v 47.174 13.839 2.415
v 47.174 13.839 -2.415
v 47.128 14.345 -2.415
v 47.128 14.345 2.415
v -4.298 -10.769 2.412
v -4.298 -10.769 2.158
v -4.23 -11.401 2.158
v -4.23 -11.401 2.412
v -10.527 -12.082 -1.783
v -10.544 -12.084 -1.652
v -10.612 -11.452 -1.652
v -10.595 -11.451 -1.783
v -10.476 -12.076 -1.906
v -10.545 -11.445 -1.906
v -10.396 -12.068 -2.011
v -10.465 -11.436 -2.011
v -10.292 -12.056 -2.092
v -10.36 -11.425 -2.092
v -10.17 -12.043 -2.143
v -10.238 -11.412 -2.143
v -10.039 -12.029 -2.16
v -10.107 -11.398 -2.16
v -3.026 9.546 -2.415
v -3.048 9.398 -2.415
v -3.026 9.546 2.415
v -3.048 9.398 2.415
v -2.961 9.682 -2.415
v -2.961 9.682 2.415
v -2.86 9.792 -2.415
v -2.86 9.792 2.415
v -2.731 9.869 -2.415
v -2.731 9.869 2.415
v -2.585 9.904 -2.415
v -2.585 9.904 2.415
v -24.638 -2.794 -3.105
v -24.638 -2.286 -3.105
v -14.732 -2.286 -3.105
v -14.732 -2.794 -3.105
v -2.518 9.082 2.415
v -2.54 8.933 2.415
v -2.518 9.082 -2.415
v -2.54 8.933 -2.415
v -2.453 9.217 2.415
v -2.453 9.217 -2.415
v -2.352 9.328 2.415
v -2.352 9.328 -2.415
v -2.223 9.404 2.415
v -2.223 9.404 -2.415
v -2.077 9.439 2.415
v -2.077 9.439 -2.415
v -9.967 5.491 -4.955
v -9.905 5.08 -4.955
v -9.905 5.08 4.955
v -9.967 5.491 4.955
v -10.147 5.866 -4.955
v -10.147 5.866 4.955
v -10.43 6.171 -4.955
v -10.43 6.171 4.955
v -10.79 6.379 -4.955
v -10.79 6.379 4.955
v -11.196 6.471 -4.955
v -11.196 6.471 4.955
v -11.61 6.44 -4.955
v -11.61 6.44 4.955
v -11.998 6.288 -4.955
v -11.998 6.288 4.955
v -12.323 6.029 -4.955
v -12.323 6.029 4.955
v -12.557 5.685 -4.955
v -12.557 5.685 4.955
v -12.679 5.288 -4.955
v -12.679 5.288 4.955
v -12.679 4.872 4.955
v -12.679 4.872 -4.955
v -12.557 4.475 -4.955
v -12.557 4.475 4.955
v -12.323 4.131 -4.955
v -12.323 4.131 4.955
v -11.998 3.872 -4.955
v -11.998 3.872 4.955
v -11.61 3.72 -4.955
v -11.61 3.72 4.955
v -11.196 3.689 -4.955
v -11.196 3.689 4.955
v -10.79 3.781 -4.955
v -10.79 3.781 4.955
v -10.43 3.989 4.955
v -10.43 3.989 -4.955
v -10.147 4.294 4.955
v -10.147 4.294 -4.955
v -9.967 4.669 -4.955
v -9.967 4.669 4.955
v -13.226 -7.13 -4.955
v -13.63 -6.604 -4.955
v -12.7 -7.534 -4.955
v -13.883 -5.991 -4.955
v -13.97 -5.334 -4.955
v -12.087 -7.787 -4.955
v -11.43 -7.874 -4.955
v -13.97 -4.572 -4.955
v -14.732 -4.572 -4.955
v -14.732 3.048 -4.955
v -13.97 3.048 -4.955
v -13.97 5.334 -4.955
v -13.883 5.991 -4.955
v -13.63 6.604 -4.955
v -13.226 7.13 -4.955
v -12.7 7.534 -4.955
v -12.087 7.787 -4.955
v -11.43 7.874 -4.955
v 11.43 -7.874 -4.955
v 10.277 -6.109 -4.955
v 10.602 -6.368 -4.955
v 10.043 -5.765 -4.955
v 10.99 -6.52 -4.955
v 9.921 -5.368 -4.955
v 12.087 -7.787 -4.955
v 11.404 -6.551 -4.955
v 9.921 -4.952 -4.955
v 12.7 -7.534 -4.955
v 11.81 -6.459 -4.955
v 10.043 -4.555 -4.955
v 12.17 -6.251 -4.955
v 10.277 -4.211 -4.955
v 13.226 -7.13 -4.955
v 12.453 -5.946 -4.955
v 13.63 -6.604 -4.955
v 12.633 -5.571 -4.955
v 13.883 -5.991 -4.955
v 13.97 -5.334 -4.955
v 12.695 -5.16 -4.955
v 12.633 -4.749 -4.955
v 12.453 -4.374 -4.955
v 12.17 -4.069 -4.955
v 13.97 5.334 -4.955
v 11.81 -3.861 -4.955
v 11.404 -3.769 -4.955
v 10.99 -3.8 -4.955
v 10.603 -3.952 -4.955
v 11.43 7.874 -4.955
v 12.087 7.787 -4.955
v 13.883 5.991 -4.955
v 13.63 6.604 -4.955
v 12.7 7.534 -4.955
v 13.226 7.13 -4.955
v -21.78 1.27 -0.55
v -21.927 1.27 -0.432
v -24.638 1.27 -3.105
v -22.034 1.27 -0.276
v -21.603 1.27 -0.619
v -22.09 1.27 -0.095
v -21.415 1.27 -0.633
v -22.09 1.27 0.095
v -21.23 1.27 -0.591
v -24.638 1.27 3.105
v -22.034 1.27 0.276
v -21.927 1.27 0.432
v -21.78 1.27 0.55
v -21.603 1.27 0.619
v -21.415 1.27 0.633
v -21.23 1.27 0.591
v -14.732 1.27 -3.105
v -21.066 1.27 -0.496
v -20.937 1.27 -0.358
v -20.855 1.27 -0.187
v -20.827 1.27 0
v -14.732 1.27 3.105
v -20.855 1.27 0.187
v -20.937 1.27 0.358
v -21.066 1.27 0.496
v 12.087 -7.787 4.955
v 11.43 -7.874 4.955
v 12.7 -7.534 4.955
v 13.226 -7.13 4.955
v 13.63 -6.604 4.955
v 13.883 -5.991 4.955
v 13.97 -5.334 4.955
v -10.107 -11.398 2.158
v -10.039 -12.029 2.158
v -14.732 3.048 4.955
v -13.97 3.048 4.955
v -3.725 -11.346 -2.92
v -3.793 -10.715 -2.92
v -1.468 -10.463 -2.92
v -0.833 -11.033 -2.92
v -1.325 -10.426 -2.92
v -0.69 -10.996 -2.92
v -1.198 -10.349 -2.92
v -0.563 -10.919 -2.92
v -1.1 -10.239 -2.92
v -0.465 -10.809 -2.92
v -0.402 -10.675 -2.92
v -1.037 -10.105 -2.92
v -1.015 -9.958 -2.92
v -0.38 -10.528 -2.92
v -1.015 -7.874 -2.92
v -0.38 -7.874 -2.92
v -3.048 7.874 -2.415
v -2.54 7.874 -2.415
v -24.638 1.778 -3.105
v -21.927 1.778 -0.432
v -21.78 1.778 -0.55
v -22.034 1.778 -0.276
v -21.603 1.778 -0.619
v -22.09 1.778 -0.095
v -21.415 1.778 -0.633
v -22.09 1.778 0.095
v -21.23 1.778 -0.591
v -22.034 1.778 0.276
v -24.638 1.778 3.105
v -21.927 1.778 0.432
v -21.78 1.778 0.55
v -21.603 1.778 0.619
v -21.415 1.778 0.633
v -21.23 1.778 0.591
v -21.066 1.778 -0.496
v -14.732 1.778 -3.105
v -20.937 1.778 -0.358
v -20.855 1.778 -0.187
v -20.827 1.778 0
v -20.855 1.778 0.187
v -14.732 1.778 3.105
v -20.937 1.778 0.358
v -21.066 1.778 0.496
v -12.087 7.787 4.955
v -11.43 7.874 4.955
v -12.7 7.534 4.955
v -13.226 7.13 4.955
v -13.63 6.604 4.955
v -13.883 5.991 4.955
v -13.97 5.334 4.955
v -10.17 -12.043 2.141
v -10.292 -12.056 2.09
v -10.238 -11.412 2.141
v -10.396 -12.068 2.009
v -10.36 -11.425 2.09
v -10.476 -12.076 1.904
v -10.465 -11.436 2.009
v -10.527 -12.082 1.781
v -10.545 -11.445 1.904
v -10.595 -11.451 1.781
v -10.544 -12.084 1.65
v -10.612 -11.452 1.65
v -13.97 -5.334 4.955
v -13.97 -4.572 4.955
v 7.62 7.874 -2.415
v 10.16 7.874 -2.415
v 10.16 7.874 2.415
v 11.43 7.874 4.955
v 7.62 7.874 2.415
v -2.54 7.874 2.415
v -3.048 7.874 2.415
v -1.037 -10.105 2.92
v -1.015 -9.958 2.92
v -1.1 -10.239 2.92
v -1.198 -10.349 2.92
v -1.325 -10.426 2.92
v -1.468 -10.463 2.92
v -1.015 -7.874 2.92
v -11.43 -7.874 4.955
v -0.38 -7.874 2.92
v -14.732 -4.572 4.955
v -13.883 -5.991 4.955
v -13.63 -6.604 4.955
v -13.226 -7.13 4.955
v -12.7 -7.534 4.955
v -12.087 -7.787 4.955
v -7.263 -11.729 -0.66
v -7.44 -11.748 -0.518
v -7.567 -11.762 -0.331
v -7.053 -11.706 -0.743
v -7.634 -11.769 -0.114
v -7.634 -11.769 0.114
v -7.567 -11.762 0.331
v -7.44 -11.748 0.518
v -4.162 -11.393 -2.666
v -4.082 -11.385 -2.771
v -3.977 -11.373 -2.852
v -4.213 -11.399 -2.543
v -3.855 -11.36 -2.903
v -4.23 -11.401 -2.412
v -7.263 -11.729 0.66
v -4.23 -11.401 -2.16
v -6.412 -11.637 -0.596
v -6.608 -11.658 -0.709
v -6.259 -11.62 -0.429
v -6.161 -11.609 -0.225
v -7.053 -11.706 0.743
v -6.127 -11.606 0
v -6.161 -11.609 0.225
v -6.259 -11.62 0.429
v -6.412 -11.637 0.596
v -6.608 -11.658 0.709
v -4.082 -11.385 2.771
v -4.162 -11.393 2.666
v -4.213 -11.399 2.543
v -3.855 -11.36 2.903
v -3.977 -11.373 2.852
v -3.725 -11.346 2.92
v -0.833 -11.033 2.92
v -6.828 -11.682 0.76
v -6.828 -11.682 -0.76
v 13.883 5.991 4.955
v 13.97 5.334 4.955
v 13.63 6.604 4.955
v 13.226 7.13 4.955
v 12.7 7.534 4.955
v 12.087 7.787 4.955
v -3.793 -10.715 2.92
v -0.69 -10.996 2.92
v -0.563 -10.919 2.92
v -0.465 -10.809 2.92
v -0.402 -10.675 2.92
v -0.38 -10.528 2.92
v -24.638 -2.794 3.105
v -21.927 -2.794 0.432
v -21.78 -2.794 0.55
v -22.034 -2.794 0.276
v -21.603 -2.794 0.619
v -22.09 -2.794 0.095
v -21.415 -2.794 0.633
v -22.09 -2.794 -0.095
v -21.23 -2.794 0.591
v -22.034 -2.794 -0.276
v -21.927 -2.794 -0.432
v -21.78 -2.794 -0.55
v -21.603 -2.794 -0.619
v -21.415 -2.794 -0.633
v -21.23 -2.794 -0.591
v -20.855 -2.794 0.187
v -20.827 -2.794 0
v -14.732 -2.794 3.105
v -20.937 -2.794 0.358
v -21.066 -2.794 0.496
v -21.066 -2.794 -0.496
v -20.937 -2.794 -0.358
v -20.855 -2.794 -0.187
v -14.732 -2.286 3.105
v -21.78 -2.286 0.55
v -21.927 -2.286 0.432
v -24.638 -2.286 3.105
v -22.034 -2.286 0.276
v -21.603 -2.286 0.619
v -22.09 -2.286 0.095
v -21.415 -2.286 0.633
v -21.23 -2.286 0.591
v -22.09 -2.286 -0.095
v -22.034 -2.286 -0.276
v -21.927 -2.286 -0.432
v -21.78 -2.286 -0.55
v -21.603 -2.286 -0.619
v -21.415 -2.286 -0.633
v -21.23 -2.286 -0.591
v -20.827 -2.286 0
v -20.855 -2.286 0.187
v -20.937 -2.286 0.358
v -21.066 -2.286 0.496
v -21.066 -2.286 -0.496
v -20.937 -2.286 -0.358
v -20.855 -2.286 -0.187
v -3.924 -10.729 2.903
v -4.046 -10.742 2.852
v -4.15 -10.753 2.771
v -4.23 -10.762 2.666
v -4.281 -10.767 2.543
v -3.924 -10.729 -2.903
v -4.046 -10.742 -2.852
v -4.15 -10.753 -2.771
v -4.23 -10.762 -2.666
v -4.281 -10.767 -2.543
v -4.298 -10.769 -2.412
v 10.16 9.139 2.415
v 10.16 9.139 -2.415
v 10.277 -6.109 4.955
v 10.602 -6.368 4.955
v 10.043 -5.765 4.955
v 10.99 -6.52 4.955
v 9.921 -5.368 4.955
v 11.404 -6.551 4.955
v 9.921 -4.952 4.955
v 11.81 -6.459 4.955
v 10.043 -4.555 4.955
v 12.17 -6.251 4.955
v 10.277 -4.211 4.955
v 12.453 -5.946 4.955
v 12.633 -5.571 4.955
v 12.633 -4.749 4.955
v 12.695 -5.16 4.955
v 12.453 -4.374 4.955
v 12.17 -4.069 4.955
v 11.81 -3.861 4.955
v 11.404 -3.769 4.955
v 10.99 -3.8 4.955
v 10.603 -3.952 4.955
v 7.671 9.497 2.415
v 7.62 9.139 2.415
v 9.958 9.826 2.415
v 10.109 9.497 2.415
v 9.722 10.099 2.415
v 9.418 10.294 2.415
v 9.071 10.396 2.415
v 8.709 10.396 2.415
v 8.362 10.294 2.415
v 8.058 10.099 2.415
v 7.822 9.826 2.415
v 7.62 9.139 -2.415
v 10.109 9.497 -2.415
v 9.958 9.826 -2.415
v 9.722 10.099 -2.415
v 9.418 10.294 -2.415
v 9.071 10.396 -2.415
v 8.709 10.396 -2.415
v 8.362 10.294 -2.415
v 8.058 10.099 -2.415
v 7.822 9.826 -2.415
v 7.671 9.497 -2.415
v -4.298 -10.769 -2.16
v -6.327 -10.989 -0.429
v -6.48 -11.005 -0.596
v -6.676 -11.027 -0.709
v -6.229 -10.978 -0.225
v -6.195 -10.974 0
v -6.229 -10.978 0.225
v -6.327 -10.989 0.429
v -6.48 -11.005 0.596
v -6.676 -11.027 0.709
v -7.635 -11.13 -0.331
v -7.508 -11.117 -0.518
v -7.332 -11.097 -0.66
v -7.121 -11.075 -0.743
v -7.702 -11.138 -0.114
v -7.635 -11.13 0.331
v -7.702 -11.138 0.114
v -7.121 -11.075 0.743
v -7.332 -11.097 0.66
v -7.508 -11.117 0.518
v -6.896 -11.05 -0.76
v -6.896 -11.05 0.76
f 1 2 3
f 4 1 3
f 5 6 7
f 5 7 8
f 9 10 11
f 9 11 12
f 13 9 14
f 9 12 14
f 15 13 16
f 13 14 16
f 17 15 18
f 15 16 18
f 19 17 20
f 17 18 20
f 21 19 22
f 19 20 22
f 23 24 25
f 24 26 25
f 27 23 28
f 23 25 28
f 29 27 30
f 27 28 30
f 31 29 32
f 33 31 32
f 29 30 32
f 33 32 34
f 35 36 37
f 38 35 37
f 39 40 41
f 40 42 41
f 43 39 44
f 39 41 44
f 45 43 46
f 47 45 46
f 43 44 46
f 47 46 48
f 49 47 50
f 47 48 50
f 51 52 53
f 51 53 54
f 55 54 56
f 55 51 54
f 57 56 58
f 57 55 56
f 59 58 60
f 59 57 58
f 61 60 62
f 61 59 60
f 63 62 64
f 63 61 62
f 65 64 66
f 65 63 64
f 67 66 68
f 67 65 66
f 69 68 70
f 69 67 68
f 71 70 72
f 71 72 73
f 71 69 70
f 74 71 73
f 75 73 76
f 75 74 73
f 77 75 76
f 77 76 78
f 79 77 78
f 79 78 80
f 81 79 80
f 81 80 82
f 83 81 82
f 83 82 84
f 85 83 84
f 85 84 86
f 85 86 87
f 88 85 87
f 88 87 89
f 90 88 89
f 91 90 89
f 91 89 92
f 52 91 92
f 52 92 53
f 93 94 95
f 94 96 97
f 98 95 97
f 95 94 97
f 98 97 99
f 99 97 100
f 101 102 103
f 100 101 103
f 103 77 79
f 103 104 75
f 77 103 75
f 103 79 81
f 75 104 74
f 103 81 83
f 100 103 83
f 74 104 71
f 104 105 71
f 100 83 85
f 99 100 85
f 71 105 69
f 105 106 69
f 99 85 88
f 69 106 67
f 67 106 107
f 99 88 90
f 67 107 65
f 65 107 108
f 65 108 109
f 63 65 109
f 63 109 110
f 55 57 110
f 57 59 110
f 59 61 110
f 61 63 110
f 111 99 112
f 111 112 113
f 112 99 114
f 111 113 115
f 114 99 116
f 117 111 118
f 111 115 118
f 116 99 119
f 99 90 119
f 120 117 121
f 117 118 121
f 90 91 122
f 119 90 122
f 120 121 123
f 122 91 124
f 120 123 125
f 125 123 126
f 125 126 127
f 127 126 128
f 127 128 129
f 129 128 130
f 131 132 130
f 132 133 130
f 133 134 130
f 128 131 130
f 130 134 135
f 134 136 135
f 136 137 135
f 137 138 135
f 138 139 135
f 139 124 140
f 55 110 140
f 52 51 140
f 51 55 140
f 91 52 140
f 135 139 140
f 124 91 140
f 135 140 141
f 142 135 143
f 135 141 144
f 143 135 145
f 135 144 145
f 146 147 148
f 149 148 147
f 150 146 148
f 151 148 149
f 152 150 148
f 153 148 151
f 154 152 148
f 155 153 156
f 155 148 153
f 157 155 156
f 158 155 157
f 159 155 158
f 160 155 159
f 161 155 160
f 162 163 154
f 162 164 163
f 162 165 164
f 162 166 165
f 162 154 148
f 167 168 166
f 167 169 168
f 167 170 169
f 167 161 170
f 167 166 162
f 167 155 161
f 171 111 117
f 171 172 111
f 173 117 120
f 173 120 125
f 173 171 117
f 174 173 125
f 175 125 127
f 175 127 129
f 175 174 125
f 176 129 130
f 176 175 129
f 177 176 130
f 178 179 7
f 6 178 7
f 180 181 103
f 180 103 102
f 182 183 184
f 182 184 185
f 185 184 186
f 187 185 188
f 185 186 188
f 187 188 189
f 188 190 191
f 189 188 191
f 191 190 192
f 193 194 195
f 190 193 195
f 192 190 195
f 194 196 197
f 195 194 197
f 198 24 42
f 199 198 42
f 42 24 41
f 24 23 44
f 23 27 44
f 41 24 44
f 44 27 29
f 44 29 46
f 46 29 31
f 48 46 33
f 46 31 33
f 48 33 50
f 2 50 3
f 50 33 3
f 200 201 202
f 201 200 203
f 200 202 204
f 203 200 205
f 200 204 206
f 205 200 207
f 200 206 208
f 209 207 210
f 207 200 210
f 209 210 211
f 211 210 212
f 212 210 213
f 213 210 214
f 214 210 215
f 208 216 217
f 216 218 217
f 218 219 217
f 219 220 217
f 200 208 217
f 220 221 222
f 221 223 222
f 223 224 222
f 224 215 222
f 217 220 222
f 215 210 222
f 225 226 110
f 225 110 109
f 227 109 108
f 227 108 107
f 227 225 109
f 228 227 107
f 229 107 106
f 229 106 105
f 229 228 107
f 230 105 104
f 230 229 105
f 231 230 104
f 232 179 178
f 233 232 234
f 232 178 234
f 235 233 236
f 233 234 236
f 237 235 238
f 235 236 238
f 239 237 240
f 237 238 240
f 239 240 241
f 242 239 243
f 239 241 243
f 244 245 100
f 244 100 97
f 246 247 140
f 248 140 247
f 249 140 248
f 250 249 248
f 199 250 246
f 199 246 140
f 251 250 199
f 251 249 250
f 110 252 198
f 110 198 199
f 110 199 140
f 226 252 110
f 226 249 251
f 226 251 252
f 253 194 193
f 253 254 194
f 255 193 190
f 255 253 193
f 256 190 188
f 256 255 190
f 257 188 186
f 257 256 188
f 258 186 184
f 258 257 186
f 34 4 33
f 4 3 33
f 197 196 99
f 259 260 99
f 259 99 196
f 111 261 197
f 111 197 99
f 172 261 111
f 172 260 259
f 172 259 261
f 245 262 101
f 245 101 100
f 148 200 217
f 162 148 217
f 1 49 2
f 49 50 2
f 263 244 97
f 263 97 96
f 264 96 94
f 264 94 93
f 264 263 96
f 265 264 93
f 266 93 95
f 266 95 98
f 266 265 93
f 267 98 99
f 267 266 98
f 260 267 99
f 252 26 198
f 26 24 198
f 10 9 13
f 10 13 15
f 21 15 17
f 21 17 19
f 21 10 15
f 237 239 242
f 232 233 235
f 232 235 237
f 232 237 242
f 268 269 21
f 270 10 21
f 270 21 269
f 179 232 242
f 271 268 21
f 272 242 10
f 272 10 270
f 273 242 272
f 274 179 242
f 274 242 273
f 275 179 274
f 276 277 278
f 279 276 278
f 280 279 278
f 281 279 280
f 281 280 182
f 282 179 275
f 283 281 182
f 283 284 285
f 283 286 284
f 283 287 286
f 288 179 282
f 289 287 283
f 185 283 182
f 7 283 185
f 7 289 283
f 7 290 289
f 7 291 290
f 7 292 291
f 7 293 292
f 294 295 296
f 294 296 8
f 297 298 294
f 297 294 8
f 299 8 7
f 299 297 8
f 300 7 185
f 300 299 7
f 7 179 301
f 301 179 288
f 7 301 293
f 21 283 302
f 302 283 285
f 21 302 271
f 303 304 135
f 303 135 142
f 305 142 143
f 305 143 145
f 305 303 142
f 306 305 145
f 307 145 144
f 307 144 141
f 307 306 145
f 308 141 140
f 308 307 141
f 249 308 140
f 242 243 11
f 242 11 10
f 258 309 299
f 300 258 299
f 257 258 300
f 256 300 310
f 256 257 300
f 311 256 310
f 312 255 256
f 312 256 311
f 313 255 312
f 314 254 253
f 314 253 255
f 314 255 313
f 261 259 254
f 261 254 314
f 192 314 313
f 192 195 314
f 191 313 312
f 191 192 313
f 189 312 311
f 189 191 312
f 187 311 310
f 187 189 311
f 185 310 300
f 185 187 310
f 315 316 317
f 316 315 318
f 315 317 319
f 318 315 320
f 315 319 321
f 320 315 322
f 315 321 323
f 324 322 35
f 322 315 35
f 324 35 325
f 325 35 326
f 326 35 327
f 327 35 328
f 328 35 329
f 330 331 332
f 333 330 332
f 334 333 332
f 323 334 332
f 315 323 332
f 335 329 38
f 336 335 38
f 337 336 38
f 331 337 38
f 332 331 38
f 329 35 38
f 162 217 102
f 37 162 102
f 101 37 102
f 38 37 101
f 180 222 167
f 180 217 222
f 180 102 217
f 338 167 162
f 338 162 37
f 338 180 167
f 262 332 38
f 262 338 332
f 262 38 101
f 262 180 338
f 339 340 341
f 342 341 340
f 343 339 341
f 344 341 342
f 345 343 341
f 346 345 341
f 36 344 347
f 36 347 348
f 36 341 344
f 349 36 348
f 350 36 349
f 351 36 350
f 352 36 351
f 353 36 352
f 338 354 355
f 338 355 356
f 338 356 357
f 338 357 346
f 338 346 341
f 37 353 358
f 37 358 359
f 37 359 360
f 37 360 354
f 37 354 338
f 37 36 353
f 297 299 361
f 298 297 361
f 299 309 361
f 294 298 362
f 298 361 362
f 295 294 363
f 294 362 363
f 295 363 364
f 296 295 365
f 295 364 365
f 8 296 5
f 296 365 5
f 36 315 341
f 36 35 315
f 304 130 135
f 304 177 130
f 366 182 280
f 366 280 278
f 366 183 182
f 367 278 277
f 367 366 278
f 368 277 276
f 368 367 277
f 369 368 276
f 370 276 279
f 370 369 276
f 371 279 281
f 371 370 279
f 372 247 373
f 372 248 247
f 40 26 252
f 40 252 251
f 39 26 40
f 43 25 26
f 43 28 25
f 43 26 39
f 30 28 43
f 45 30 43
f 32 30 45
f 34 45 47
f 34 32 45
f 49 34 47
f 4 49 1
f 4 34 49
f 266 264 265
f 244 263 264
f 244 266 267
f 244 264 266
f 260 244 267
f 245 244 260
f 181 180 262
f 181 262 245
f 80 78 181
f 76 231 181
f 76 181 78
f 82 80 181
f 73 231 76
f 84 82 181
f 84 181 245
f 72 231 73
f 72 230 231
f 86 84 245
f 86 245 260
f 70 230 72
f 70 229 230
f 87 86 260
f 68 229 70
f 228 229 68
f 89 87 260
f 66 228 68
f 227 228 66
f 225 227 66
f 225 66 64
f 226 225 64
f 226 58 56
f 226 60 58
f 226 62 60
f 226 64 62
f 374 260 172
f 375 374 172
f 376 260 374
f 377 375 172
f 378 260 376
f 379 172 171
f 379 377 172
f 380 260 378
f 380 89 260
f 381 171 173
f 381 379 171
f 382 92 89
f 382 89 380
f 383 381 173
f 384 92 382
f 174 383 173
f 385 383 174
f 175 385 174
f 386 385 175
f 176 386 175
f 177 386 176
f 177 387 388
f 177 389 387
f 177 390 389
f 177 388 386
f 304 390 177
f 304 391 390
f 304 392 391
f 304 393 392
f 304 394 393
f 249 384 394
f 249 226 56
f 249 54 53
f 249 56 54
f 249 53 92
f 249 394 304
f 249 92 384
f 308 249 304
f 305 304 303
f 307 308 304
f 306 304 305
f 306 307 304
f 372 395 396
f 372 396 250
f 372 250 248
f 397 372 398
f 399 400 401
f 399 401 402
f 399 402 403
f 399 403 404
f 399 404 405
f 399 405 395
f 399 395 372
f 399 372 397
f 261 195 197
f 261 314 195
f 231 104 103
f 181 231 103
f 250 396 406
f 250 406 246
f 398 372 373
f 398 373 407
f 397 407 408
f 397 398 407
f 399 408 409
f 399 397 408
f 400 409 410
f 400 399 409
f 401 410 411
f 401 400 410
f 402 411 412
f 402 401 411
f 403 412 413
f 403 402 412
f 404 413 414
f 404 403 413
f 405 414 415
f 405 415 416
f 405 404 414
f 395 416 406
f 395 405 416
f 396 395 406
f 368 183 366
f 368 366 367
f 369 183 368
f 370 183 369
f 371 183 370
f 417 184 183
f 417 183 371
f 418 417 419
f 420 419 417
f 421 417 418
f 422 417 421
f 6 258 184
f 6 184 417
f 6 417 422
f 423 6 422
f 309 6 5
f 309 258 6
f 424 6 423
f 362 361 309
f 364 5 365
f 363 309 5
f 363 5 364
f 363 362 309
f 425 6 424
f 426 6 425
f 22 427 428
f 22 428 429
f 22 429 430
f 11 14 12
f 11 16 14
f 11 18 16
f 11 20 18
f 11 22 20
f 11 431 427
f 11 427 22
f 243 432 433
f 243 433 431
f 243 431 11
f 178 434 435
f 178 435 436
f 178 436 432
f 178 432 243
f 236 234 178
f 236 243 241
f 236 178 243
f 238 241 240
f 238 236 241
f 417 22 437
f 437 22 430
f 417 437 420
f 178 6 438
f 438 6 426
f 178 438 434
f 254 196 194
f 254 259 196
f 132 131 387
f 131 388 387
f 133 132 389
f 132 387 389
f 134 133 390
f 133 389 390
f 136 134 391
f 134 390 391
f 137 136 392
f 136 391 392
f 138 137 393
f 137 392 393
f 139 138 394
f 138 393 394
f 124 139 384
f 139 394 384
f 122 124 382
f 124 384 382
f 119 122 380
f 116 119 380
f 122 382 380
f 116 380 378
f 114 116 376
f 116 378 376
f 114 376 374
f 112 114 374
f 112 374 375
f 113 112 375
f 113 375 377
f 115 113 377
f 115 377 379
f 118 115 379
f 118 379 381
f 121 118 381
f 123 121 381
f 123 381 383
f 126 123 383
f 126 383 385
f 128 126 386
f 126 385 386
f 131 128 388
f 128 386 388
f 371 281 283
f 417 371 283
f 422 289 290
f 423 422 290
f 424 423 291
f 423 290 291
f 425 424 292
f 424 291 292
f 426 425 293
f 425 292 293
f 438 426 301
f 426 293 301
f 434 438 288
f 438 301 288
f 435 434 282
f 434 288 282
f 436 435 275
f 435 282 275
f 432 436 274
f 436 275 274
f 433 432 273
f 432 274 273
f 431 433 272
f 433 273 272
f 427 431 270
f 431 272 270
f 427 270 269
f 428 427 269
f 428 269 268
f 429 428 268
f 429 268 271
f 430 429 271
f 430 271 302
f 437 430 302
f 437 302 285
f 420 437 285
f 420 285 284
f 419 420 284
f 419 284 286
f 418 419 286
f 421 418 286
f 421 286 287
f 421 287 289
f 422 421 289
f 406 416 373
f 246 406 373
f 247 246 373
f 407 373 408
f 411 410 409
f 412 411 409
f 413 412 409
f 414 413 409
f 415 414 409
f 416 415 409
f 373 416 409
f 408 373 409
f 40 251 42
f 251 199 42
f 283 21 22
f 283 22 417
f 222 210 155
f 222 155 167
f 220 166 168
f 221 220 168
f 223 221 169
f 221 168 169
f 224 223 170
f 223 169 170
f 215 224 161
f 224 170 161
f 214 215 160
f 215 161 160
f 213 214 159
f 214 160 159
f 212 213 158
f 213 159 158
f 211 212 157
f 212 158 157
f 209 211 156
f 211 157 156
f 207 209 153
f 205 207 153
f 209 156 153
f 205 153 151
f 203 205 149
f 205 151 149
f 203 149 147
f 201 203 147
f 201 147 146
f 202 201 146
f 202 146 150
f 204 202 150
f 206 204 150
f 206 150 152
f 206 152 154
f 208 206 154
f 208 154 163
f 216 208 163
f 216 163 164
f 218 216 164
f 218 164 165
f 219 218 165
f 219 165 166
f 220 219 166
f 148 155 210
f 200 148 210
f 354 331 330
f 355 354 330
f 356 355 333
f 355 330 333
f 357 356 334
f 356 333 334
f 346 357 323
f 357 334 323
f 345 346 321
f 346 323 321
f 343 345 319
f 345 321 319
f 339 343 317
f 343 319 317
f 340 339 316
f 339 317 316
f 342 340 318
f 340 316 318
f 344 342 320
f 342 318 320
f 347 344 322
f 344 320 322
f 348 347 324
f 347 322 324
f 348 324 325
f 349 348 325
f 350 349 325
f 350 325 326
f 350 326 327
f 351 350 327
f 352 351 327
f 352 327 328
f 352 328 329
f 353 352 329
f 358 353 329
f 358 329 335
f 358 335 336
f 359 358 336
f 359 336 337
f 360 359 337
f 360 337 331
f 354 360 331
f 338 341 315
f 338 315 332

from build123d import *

# Parameters (mm, degrees)
SKETCH1_R      = 1.395
EXTRUDE1_DEPTH = 4.955
SKETCH2_W      = 9.906
SKETCH2_H      = 0.508
EXTRUDE2_DEPTH = 3.105
EXTRUDE3_DEPTH = 2.415
EXTRUDE4_DEPTH = 2.92
EXTRUDE5_REACH = 29.791
SKETCH5_W      = 6.351205797
SKETCH5_H      = 0.762
SKETCH5_H_2    = 0.76
EXTRUDE6_REACH = 29.791
SKETCH_R       = 0.762
FILLET1_R      = 0.508
SKETCH6_R      = 0.635
EXTRUDE7_DEPTH = 4.572
SKETCH_2_R     = 1.395
EXTRUDE8_DEPTH = 7.92


with BuildPart() as part:
    # Sketch1 → Extrude1 (new body, symmetric)
    with BuildSketch(Plane.XY):
        with Locations((-11.3, 5.08)):
            Circle(SKETCH1_R)
        with BuildLine():
            Line((13.97, -5.334), (13.97, 5.334))
            ThreePointArc((13.97, 5.334), (13.226051224, 7.130051224), (11.43, 7.874))
            Line((11.43, 7.874), (-11.43, 7.874))
            ThreePointArc((-11.43, 7.874), (-13.226051224, 7.130051224), (-13.97, 5.334))
            Line((-13.97, 5.334), (-13.97, 3.048))
            Line((-13.97, 3.048), (-14.732, 3.048))
            Line((-14.732, 3.048), (-14.732, -4.572))
            Line((-14.732, -4.572), (-13.97, -4.572))
            Line((-13.97, -4.572), (-13.97, -5.334))
            ThreePointArc((-13.97, -5.334), (-13.226051224, -7.130051224), (-11.43, -7.874))
            Line((-11.43, -7.874), (11.43, -7.874))
            ThreePointArc((11.43, -7.874), (13.226051224, -7.130051224), (13.97, -5.334))
        make_face()
        with Locations((11.3, -5.16)):
            Circle(SKETCH1_R, mode=Mode.SUBTRACT)
        with Locations((-11.3, 5.08)):
            Circle(SKETCH1_R, mode=Mode.SUBTRACT)
        with Locations((11.3, -5.16)):
            Circle(SKETCH1_R)
    extrude(amount=EXTRUDE1_DEPTH, both=True)

    # Sketch2 → Extrude2 (add, symmetric)
    with BuildSketch(Plane.XY):
        with Locations((-19.685, -2.54)):
            Rectangle(SKETCH2_W, SKETCH2_H)
        with Locations((-19.685, 1.524)):
            Rectangle(SKETCH2_W, SKETCH2_H)
    extrude(amount=EXTRUDE2_DEPTH, both=True)

    # Sketch3 → Extrude3 (add, symmetric)
    with BuildSketch(Plane.XY):
        Polygon((47.128347754, 14.344963285), (-3.048, 9.862642591), (-3.048, 7.874), (-2.54, 7.874), (-2.54, 9.398), (47.173548085, 13.838978176), align=None)
        with BuildLine():
            Line((10.16, 7.874), (10.16, 9.139))
            ThreePointArc((10.16, 9.139), (8.89, 10.409), (7.62, 9.139))
            Line((7.62, 9.139), (7.62, 7.874))
            Line((7.62, 7.874), (10.16, 7.874))
        make_face()
    extrude(amount=EXTRUDE3_DEPTH, both=True)

    # Sketch4 → Extrude4 (add, symmetric)
    with BuildSketch(Plane.XY):
        Polygon((-0.38, -10.984), (-0.38, -7.874), (-1.015, -7.874), (-1.015, -10.414), (-10.612457197, -11.452431876), (-10.54414973, -12.083747241), align=None)
    extrude(amount=EXTRUDE4_DEPTH, both=True)

    # Sketch5 → Extrude5 (cut, up to next)
    with BuildSketch(Plane(origin=(1.170304596, -10.816259141, 0), x_dir=(0.994197425, 0.107570815, 0), z_dir=(0.107570815, -0.994197425, 0)), mode=Mode.PRIVATE) as extrude5_sk1:
        with Locations((-8.607222155, 2.539)):
            Rectangle(SKETCH5_W, SKETCH5_H)
    extrude5_tool1 = extrude(extrude5_sk1.sketch, amount=-EXTRUDE5_REACH, mode=Mode.PRIVATE) & part.part
    add(extrude5_tool1.solids().sort_by_distance((-7.386974, -11.742145, 2.539))[0], mode=Mode.SUBTRACT)
    # Sketch5 → Extrude5 (cut, up to next)
    with BuildSketch(Plane(origin=(1.170304596, -10.816259141, 0), x_dir=(0.994197425, 0.107570815, 0), z_dir=(0.107570815, -0.994197425, 0)), mode=Mode.PRIVATE) as extrude5_sk2:
        with Locations((-8.607222155, -2.54)):
            Rectangle(SKETCH5_W, SKETCH5_H_2)
    extrude5_tool2 = extrude(extrude5_sk2.sketch, amount=-EXTRUDE5_REACH, mode=Mode.PRIVATE) & part.part
    add(extrude5_tool2.solids().sort_by_distance((-7.386974, -11.742145, -2.54))[0], mode=Mode.SUBTRACT)

    # Sketch → Extrude6 (cut, up to next)
    with BuildSketch(Plane(origin=(1.170304596, -10.816259141, 0), x_dir=(0.994197425, 0.107570815, 0), z_dir=(0.107570815, -0.994197425, 0)), mode=Mode.PRIVATE) as extrude6_sk1:
        with Locations((-8.101824296, 0)):
            Circle(SKETCH_R)
    extrude6_tool1 = extrude(extrude6_sk1.sketch, amount=-EXTRUDE6_REACH, mode=Mode.PRIVATE) & part.part
    add(extrude6_tool1.solids().sort_by_distance((-6.884508, -11.687779, 0))[0], mode=Mode.SUBTRACT)

    # Fillet1
    fillet1_edges = [part.edges().sort_by_distance(p)[0] for p in [
        (-4.263951014, -11.084885172, 2.92),
        (-10.578303464, -11.768089558, 2.158),
        (-10.578303464, -11.768089558, -2.16),
        (-4.263951014, -11.084885172, -2.92),
        (-3.048, 9.862642591, 0),
        (-2.54, 9.398, 0),
        (-0.38, -10.984, 0),
        (-1.015, -10.414, 0),
    ]]
    fillet(fillet1_edges, radius=FILLET1_R)

    # Sketch6 → Extrude7 (cut)
    with BuildSketch(Plane.XZ.offset(2.794)):
        with Locations((-21.462, 0)):
            Circle(SKETCH6_R)
    extrude(amount=-EXTRUDE7_DEPTH, mode=Mode.SUBTRACT)

    # Sketch 2 → Extrude8 (cut, symmetric)
    with BuildSketch(Plane.XY):
        with Locations((-11.3, 5.08)):
            Circle(SKETCH_2_R)
        with Locations((11.3, -5.16)):
            Circle(SKETCH_2_R)
    extrude(amount=EXTRUDE8_DEPTH, both=True, mode=Mode.SUBTRACT)


solid = part.part
